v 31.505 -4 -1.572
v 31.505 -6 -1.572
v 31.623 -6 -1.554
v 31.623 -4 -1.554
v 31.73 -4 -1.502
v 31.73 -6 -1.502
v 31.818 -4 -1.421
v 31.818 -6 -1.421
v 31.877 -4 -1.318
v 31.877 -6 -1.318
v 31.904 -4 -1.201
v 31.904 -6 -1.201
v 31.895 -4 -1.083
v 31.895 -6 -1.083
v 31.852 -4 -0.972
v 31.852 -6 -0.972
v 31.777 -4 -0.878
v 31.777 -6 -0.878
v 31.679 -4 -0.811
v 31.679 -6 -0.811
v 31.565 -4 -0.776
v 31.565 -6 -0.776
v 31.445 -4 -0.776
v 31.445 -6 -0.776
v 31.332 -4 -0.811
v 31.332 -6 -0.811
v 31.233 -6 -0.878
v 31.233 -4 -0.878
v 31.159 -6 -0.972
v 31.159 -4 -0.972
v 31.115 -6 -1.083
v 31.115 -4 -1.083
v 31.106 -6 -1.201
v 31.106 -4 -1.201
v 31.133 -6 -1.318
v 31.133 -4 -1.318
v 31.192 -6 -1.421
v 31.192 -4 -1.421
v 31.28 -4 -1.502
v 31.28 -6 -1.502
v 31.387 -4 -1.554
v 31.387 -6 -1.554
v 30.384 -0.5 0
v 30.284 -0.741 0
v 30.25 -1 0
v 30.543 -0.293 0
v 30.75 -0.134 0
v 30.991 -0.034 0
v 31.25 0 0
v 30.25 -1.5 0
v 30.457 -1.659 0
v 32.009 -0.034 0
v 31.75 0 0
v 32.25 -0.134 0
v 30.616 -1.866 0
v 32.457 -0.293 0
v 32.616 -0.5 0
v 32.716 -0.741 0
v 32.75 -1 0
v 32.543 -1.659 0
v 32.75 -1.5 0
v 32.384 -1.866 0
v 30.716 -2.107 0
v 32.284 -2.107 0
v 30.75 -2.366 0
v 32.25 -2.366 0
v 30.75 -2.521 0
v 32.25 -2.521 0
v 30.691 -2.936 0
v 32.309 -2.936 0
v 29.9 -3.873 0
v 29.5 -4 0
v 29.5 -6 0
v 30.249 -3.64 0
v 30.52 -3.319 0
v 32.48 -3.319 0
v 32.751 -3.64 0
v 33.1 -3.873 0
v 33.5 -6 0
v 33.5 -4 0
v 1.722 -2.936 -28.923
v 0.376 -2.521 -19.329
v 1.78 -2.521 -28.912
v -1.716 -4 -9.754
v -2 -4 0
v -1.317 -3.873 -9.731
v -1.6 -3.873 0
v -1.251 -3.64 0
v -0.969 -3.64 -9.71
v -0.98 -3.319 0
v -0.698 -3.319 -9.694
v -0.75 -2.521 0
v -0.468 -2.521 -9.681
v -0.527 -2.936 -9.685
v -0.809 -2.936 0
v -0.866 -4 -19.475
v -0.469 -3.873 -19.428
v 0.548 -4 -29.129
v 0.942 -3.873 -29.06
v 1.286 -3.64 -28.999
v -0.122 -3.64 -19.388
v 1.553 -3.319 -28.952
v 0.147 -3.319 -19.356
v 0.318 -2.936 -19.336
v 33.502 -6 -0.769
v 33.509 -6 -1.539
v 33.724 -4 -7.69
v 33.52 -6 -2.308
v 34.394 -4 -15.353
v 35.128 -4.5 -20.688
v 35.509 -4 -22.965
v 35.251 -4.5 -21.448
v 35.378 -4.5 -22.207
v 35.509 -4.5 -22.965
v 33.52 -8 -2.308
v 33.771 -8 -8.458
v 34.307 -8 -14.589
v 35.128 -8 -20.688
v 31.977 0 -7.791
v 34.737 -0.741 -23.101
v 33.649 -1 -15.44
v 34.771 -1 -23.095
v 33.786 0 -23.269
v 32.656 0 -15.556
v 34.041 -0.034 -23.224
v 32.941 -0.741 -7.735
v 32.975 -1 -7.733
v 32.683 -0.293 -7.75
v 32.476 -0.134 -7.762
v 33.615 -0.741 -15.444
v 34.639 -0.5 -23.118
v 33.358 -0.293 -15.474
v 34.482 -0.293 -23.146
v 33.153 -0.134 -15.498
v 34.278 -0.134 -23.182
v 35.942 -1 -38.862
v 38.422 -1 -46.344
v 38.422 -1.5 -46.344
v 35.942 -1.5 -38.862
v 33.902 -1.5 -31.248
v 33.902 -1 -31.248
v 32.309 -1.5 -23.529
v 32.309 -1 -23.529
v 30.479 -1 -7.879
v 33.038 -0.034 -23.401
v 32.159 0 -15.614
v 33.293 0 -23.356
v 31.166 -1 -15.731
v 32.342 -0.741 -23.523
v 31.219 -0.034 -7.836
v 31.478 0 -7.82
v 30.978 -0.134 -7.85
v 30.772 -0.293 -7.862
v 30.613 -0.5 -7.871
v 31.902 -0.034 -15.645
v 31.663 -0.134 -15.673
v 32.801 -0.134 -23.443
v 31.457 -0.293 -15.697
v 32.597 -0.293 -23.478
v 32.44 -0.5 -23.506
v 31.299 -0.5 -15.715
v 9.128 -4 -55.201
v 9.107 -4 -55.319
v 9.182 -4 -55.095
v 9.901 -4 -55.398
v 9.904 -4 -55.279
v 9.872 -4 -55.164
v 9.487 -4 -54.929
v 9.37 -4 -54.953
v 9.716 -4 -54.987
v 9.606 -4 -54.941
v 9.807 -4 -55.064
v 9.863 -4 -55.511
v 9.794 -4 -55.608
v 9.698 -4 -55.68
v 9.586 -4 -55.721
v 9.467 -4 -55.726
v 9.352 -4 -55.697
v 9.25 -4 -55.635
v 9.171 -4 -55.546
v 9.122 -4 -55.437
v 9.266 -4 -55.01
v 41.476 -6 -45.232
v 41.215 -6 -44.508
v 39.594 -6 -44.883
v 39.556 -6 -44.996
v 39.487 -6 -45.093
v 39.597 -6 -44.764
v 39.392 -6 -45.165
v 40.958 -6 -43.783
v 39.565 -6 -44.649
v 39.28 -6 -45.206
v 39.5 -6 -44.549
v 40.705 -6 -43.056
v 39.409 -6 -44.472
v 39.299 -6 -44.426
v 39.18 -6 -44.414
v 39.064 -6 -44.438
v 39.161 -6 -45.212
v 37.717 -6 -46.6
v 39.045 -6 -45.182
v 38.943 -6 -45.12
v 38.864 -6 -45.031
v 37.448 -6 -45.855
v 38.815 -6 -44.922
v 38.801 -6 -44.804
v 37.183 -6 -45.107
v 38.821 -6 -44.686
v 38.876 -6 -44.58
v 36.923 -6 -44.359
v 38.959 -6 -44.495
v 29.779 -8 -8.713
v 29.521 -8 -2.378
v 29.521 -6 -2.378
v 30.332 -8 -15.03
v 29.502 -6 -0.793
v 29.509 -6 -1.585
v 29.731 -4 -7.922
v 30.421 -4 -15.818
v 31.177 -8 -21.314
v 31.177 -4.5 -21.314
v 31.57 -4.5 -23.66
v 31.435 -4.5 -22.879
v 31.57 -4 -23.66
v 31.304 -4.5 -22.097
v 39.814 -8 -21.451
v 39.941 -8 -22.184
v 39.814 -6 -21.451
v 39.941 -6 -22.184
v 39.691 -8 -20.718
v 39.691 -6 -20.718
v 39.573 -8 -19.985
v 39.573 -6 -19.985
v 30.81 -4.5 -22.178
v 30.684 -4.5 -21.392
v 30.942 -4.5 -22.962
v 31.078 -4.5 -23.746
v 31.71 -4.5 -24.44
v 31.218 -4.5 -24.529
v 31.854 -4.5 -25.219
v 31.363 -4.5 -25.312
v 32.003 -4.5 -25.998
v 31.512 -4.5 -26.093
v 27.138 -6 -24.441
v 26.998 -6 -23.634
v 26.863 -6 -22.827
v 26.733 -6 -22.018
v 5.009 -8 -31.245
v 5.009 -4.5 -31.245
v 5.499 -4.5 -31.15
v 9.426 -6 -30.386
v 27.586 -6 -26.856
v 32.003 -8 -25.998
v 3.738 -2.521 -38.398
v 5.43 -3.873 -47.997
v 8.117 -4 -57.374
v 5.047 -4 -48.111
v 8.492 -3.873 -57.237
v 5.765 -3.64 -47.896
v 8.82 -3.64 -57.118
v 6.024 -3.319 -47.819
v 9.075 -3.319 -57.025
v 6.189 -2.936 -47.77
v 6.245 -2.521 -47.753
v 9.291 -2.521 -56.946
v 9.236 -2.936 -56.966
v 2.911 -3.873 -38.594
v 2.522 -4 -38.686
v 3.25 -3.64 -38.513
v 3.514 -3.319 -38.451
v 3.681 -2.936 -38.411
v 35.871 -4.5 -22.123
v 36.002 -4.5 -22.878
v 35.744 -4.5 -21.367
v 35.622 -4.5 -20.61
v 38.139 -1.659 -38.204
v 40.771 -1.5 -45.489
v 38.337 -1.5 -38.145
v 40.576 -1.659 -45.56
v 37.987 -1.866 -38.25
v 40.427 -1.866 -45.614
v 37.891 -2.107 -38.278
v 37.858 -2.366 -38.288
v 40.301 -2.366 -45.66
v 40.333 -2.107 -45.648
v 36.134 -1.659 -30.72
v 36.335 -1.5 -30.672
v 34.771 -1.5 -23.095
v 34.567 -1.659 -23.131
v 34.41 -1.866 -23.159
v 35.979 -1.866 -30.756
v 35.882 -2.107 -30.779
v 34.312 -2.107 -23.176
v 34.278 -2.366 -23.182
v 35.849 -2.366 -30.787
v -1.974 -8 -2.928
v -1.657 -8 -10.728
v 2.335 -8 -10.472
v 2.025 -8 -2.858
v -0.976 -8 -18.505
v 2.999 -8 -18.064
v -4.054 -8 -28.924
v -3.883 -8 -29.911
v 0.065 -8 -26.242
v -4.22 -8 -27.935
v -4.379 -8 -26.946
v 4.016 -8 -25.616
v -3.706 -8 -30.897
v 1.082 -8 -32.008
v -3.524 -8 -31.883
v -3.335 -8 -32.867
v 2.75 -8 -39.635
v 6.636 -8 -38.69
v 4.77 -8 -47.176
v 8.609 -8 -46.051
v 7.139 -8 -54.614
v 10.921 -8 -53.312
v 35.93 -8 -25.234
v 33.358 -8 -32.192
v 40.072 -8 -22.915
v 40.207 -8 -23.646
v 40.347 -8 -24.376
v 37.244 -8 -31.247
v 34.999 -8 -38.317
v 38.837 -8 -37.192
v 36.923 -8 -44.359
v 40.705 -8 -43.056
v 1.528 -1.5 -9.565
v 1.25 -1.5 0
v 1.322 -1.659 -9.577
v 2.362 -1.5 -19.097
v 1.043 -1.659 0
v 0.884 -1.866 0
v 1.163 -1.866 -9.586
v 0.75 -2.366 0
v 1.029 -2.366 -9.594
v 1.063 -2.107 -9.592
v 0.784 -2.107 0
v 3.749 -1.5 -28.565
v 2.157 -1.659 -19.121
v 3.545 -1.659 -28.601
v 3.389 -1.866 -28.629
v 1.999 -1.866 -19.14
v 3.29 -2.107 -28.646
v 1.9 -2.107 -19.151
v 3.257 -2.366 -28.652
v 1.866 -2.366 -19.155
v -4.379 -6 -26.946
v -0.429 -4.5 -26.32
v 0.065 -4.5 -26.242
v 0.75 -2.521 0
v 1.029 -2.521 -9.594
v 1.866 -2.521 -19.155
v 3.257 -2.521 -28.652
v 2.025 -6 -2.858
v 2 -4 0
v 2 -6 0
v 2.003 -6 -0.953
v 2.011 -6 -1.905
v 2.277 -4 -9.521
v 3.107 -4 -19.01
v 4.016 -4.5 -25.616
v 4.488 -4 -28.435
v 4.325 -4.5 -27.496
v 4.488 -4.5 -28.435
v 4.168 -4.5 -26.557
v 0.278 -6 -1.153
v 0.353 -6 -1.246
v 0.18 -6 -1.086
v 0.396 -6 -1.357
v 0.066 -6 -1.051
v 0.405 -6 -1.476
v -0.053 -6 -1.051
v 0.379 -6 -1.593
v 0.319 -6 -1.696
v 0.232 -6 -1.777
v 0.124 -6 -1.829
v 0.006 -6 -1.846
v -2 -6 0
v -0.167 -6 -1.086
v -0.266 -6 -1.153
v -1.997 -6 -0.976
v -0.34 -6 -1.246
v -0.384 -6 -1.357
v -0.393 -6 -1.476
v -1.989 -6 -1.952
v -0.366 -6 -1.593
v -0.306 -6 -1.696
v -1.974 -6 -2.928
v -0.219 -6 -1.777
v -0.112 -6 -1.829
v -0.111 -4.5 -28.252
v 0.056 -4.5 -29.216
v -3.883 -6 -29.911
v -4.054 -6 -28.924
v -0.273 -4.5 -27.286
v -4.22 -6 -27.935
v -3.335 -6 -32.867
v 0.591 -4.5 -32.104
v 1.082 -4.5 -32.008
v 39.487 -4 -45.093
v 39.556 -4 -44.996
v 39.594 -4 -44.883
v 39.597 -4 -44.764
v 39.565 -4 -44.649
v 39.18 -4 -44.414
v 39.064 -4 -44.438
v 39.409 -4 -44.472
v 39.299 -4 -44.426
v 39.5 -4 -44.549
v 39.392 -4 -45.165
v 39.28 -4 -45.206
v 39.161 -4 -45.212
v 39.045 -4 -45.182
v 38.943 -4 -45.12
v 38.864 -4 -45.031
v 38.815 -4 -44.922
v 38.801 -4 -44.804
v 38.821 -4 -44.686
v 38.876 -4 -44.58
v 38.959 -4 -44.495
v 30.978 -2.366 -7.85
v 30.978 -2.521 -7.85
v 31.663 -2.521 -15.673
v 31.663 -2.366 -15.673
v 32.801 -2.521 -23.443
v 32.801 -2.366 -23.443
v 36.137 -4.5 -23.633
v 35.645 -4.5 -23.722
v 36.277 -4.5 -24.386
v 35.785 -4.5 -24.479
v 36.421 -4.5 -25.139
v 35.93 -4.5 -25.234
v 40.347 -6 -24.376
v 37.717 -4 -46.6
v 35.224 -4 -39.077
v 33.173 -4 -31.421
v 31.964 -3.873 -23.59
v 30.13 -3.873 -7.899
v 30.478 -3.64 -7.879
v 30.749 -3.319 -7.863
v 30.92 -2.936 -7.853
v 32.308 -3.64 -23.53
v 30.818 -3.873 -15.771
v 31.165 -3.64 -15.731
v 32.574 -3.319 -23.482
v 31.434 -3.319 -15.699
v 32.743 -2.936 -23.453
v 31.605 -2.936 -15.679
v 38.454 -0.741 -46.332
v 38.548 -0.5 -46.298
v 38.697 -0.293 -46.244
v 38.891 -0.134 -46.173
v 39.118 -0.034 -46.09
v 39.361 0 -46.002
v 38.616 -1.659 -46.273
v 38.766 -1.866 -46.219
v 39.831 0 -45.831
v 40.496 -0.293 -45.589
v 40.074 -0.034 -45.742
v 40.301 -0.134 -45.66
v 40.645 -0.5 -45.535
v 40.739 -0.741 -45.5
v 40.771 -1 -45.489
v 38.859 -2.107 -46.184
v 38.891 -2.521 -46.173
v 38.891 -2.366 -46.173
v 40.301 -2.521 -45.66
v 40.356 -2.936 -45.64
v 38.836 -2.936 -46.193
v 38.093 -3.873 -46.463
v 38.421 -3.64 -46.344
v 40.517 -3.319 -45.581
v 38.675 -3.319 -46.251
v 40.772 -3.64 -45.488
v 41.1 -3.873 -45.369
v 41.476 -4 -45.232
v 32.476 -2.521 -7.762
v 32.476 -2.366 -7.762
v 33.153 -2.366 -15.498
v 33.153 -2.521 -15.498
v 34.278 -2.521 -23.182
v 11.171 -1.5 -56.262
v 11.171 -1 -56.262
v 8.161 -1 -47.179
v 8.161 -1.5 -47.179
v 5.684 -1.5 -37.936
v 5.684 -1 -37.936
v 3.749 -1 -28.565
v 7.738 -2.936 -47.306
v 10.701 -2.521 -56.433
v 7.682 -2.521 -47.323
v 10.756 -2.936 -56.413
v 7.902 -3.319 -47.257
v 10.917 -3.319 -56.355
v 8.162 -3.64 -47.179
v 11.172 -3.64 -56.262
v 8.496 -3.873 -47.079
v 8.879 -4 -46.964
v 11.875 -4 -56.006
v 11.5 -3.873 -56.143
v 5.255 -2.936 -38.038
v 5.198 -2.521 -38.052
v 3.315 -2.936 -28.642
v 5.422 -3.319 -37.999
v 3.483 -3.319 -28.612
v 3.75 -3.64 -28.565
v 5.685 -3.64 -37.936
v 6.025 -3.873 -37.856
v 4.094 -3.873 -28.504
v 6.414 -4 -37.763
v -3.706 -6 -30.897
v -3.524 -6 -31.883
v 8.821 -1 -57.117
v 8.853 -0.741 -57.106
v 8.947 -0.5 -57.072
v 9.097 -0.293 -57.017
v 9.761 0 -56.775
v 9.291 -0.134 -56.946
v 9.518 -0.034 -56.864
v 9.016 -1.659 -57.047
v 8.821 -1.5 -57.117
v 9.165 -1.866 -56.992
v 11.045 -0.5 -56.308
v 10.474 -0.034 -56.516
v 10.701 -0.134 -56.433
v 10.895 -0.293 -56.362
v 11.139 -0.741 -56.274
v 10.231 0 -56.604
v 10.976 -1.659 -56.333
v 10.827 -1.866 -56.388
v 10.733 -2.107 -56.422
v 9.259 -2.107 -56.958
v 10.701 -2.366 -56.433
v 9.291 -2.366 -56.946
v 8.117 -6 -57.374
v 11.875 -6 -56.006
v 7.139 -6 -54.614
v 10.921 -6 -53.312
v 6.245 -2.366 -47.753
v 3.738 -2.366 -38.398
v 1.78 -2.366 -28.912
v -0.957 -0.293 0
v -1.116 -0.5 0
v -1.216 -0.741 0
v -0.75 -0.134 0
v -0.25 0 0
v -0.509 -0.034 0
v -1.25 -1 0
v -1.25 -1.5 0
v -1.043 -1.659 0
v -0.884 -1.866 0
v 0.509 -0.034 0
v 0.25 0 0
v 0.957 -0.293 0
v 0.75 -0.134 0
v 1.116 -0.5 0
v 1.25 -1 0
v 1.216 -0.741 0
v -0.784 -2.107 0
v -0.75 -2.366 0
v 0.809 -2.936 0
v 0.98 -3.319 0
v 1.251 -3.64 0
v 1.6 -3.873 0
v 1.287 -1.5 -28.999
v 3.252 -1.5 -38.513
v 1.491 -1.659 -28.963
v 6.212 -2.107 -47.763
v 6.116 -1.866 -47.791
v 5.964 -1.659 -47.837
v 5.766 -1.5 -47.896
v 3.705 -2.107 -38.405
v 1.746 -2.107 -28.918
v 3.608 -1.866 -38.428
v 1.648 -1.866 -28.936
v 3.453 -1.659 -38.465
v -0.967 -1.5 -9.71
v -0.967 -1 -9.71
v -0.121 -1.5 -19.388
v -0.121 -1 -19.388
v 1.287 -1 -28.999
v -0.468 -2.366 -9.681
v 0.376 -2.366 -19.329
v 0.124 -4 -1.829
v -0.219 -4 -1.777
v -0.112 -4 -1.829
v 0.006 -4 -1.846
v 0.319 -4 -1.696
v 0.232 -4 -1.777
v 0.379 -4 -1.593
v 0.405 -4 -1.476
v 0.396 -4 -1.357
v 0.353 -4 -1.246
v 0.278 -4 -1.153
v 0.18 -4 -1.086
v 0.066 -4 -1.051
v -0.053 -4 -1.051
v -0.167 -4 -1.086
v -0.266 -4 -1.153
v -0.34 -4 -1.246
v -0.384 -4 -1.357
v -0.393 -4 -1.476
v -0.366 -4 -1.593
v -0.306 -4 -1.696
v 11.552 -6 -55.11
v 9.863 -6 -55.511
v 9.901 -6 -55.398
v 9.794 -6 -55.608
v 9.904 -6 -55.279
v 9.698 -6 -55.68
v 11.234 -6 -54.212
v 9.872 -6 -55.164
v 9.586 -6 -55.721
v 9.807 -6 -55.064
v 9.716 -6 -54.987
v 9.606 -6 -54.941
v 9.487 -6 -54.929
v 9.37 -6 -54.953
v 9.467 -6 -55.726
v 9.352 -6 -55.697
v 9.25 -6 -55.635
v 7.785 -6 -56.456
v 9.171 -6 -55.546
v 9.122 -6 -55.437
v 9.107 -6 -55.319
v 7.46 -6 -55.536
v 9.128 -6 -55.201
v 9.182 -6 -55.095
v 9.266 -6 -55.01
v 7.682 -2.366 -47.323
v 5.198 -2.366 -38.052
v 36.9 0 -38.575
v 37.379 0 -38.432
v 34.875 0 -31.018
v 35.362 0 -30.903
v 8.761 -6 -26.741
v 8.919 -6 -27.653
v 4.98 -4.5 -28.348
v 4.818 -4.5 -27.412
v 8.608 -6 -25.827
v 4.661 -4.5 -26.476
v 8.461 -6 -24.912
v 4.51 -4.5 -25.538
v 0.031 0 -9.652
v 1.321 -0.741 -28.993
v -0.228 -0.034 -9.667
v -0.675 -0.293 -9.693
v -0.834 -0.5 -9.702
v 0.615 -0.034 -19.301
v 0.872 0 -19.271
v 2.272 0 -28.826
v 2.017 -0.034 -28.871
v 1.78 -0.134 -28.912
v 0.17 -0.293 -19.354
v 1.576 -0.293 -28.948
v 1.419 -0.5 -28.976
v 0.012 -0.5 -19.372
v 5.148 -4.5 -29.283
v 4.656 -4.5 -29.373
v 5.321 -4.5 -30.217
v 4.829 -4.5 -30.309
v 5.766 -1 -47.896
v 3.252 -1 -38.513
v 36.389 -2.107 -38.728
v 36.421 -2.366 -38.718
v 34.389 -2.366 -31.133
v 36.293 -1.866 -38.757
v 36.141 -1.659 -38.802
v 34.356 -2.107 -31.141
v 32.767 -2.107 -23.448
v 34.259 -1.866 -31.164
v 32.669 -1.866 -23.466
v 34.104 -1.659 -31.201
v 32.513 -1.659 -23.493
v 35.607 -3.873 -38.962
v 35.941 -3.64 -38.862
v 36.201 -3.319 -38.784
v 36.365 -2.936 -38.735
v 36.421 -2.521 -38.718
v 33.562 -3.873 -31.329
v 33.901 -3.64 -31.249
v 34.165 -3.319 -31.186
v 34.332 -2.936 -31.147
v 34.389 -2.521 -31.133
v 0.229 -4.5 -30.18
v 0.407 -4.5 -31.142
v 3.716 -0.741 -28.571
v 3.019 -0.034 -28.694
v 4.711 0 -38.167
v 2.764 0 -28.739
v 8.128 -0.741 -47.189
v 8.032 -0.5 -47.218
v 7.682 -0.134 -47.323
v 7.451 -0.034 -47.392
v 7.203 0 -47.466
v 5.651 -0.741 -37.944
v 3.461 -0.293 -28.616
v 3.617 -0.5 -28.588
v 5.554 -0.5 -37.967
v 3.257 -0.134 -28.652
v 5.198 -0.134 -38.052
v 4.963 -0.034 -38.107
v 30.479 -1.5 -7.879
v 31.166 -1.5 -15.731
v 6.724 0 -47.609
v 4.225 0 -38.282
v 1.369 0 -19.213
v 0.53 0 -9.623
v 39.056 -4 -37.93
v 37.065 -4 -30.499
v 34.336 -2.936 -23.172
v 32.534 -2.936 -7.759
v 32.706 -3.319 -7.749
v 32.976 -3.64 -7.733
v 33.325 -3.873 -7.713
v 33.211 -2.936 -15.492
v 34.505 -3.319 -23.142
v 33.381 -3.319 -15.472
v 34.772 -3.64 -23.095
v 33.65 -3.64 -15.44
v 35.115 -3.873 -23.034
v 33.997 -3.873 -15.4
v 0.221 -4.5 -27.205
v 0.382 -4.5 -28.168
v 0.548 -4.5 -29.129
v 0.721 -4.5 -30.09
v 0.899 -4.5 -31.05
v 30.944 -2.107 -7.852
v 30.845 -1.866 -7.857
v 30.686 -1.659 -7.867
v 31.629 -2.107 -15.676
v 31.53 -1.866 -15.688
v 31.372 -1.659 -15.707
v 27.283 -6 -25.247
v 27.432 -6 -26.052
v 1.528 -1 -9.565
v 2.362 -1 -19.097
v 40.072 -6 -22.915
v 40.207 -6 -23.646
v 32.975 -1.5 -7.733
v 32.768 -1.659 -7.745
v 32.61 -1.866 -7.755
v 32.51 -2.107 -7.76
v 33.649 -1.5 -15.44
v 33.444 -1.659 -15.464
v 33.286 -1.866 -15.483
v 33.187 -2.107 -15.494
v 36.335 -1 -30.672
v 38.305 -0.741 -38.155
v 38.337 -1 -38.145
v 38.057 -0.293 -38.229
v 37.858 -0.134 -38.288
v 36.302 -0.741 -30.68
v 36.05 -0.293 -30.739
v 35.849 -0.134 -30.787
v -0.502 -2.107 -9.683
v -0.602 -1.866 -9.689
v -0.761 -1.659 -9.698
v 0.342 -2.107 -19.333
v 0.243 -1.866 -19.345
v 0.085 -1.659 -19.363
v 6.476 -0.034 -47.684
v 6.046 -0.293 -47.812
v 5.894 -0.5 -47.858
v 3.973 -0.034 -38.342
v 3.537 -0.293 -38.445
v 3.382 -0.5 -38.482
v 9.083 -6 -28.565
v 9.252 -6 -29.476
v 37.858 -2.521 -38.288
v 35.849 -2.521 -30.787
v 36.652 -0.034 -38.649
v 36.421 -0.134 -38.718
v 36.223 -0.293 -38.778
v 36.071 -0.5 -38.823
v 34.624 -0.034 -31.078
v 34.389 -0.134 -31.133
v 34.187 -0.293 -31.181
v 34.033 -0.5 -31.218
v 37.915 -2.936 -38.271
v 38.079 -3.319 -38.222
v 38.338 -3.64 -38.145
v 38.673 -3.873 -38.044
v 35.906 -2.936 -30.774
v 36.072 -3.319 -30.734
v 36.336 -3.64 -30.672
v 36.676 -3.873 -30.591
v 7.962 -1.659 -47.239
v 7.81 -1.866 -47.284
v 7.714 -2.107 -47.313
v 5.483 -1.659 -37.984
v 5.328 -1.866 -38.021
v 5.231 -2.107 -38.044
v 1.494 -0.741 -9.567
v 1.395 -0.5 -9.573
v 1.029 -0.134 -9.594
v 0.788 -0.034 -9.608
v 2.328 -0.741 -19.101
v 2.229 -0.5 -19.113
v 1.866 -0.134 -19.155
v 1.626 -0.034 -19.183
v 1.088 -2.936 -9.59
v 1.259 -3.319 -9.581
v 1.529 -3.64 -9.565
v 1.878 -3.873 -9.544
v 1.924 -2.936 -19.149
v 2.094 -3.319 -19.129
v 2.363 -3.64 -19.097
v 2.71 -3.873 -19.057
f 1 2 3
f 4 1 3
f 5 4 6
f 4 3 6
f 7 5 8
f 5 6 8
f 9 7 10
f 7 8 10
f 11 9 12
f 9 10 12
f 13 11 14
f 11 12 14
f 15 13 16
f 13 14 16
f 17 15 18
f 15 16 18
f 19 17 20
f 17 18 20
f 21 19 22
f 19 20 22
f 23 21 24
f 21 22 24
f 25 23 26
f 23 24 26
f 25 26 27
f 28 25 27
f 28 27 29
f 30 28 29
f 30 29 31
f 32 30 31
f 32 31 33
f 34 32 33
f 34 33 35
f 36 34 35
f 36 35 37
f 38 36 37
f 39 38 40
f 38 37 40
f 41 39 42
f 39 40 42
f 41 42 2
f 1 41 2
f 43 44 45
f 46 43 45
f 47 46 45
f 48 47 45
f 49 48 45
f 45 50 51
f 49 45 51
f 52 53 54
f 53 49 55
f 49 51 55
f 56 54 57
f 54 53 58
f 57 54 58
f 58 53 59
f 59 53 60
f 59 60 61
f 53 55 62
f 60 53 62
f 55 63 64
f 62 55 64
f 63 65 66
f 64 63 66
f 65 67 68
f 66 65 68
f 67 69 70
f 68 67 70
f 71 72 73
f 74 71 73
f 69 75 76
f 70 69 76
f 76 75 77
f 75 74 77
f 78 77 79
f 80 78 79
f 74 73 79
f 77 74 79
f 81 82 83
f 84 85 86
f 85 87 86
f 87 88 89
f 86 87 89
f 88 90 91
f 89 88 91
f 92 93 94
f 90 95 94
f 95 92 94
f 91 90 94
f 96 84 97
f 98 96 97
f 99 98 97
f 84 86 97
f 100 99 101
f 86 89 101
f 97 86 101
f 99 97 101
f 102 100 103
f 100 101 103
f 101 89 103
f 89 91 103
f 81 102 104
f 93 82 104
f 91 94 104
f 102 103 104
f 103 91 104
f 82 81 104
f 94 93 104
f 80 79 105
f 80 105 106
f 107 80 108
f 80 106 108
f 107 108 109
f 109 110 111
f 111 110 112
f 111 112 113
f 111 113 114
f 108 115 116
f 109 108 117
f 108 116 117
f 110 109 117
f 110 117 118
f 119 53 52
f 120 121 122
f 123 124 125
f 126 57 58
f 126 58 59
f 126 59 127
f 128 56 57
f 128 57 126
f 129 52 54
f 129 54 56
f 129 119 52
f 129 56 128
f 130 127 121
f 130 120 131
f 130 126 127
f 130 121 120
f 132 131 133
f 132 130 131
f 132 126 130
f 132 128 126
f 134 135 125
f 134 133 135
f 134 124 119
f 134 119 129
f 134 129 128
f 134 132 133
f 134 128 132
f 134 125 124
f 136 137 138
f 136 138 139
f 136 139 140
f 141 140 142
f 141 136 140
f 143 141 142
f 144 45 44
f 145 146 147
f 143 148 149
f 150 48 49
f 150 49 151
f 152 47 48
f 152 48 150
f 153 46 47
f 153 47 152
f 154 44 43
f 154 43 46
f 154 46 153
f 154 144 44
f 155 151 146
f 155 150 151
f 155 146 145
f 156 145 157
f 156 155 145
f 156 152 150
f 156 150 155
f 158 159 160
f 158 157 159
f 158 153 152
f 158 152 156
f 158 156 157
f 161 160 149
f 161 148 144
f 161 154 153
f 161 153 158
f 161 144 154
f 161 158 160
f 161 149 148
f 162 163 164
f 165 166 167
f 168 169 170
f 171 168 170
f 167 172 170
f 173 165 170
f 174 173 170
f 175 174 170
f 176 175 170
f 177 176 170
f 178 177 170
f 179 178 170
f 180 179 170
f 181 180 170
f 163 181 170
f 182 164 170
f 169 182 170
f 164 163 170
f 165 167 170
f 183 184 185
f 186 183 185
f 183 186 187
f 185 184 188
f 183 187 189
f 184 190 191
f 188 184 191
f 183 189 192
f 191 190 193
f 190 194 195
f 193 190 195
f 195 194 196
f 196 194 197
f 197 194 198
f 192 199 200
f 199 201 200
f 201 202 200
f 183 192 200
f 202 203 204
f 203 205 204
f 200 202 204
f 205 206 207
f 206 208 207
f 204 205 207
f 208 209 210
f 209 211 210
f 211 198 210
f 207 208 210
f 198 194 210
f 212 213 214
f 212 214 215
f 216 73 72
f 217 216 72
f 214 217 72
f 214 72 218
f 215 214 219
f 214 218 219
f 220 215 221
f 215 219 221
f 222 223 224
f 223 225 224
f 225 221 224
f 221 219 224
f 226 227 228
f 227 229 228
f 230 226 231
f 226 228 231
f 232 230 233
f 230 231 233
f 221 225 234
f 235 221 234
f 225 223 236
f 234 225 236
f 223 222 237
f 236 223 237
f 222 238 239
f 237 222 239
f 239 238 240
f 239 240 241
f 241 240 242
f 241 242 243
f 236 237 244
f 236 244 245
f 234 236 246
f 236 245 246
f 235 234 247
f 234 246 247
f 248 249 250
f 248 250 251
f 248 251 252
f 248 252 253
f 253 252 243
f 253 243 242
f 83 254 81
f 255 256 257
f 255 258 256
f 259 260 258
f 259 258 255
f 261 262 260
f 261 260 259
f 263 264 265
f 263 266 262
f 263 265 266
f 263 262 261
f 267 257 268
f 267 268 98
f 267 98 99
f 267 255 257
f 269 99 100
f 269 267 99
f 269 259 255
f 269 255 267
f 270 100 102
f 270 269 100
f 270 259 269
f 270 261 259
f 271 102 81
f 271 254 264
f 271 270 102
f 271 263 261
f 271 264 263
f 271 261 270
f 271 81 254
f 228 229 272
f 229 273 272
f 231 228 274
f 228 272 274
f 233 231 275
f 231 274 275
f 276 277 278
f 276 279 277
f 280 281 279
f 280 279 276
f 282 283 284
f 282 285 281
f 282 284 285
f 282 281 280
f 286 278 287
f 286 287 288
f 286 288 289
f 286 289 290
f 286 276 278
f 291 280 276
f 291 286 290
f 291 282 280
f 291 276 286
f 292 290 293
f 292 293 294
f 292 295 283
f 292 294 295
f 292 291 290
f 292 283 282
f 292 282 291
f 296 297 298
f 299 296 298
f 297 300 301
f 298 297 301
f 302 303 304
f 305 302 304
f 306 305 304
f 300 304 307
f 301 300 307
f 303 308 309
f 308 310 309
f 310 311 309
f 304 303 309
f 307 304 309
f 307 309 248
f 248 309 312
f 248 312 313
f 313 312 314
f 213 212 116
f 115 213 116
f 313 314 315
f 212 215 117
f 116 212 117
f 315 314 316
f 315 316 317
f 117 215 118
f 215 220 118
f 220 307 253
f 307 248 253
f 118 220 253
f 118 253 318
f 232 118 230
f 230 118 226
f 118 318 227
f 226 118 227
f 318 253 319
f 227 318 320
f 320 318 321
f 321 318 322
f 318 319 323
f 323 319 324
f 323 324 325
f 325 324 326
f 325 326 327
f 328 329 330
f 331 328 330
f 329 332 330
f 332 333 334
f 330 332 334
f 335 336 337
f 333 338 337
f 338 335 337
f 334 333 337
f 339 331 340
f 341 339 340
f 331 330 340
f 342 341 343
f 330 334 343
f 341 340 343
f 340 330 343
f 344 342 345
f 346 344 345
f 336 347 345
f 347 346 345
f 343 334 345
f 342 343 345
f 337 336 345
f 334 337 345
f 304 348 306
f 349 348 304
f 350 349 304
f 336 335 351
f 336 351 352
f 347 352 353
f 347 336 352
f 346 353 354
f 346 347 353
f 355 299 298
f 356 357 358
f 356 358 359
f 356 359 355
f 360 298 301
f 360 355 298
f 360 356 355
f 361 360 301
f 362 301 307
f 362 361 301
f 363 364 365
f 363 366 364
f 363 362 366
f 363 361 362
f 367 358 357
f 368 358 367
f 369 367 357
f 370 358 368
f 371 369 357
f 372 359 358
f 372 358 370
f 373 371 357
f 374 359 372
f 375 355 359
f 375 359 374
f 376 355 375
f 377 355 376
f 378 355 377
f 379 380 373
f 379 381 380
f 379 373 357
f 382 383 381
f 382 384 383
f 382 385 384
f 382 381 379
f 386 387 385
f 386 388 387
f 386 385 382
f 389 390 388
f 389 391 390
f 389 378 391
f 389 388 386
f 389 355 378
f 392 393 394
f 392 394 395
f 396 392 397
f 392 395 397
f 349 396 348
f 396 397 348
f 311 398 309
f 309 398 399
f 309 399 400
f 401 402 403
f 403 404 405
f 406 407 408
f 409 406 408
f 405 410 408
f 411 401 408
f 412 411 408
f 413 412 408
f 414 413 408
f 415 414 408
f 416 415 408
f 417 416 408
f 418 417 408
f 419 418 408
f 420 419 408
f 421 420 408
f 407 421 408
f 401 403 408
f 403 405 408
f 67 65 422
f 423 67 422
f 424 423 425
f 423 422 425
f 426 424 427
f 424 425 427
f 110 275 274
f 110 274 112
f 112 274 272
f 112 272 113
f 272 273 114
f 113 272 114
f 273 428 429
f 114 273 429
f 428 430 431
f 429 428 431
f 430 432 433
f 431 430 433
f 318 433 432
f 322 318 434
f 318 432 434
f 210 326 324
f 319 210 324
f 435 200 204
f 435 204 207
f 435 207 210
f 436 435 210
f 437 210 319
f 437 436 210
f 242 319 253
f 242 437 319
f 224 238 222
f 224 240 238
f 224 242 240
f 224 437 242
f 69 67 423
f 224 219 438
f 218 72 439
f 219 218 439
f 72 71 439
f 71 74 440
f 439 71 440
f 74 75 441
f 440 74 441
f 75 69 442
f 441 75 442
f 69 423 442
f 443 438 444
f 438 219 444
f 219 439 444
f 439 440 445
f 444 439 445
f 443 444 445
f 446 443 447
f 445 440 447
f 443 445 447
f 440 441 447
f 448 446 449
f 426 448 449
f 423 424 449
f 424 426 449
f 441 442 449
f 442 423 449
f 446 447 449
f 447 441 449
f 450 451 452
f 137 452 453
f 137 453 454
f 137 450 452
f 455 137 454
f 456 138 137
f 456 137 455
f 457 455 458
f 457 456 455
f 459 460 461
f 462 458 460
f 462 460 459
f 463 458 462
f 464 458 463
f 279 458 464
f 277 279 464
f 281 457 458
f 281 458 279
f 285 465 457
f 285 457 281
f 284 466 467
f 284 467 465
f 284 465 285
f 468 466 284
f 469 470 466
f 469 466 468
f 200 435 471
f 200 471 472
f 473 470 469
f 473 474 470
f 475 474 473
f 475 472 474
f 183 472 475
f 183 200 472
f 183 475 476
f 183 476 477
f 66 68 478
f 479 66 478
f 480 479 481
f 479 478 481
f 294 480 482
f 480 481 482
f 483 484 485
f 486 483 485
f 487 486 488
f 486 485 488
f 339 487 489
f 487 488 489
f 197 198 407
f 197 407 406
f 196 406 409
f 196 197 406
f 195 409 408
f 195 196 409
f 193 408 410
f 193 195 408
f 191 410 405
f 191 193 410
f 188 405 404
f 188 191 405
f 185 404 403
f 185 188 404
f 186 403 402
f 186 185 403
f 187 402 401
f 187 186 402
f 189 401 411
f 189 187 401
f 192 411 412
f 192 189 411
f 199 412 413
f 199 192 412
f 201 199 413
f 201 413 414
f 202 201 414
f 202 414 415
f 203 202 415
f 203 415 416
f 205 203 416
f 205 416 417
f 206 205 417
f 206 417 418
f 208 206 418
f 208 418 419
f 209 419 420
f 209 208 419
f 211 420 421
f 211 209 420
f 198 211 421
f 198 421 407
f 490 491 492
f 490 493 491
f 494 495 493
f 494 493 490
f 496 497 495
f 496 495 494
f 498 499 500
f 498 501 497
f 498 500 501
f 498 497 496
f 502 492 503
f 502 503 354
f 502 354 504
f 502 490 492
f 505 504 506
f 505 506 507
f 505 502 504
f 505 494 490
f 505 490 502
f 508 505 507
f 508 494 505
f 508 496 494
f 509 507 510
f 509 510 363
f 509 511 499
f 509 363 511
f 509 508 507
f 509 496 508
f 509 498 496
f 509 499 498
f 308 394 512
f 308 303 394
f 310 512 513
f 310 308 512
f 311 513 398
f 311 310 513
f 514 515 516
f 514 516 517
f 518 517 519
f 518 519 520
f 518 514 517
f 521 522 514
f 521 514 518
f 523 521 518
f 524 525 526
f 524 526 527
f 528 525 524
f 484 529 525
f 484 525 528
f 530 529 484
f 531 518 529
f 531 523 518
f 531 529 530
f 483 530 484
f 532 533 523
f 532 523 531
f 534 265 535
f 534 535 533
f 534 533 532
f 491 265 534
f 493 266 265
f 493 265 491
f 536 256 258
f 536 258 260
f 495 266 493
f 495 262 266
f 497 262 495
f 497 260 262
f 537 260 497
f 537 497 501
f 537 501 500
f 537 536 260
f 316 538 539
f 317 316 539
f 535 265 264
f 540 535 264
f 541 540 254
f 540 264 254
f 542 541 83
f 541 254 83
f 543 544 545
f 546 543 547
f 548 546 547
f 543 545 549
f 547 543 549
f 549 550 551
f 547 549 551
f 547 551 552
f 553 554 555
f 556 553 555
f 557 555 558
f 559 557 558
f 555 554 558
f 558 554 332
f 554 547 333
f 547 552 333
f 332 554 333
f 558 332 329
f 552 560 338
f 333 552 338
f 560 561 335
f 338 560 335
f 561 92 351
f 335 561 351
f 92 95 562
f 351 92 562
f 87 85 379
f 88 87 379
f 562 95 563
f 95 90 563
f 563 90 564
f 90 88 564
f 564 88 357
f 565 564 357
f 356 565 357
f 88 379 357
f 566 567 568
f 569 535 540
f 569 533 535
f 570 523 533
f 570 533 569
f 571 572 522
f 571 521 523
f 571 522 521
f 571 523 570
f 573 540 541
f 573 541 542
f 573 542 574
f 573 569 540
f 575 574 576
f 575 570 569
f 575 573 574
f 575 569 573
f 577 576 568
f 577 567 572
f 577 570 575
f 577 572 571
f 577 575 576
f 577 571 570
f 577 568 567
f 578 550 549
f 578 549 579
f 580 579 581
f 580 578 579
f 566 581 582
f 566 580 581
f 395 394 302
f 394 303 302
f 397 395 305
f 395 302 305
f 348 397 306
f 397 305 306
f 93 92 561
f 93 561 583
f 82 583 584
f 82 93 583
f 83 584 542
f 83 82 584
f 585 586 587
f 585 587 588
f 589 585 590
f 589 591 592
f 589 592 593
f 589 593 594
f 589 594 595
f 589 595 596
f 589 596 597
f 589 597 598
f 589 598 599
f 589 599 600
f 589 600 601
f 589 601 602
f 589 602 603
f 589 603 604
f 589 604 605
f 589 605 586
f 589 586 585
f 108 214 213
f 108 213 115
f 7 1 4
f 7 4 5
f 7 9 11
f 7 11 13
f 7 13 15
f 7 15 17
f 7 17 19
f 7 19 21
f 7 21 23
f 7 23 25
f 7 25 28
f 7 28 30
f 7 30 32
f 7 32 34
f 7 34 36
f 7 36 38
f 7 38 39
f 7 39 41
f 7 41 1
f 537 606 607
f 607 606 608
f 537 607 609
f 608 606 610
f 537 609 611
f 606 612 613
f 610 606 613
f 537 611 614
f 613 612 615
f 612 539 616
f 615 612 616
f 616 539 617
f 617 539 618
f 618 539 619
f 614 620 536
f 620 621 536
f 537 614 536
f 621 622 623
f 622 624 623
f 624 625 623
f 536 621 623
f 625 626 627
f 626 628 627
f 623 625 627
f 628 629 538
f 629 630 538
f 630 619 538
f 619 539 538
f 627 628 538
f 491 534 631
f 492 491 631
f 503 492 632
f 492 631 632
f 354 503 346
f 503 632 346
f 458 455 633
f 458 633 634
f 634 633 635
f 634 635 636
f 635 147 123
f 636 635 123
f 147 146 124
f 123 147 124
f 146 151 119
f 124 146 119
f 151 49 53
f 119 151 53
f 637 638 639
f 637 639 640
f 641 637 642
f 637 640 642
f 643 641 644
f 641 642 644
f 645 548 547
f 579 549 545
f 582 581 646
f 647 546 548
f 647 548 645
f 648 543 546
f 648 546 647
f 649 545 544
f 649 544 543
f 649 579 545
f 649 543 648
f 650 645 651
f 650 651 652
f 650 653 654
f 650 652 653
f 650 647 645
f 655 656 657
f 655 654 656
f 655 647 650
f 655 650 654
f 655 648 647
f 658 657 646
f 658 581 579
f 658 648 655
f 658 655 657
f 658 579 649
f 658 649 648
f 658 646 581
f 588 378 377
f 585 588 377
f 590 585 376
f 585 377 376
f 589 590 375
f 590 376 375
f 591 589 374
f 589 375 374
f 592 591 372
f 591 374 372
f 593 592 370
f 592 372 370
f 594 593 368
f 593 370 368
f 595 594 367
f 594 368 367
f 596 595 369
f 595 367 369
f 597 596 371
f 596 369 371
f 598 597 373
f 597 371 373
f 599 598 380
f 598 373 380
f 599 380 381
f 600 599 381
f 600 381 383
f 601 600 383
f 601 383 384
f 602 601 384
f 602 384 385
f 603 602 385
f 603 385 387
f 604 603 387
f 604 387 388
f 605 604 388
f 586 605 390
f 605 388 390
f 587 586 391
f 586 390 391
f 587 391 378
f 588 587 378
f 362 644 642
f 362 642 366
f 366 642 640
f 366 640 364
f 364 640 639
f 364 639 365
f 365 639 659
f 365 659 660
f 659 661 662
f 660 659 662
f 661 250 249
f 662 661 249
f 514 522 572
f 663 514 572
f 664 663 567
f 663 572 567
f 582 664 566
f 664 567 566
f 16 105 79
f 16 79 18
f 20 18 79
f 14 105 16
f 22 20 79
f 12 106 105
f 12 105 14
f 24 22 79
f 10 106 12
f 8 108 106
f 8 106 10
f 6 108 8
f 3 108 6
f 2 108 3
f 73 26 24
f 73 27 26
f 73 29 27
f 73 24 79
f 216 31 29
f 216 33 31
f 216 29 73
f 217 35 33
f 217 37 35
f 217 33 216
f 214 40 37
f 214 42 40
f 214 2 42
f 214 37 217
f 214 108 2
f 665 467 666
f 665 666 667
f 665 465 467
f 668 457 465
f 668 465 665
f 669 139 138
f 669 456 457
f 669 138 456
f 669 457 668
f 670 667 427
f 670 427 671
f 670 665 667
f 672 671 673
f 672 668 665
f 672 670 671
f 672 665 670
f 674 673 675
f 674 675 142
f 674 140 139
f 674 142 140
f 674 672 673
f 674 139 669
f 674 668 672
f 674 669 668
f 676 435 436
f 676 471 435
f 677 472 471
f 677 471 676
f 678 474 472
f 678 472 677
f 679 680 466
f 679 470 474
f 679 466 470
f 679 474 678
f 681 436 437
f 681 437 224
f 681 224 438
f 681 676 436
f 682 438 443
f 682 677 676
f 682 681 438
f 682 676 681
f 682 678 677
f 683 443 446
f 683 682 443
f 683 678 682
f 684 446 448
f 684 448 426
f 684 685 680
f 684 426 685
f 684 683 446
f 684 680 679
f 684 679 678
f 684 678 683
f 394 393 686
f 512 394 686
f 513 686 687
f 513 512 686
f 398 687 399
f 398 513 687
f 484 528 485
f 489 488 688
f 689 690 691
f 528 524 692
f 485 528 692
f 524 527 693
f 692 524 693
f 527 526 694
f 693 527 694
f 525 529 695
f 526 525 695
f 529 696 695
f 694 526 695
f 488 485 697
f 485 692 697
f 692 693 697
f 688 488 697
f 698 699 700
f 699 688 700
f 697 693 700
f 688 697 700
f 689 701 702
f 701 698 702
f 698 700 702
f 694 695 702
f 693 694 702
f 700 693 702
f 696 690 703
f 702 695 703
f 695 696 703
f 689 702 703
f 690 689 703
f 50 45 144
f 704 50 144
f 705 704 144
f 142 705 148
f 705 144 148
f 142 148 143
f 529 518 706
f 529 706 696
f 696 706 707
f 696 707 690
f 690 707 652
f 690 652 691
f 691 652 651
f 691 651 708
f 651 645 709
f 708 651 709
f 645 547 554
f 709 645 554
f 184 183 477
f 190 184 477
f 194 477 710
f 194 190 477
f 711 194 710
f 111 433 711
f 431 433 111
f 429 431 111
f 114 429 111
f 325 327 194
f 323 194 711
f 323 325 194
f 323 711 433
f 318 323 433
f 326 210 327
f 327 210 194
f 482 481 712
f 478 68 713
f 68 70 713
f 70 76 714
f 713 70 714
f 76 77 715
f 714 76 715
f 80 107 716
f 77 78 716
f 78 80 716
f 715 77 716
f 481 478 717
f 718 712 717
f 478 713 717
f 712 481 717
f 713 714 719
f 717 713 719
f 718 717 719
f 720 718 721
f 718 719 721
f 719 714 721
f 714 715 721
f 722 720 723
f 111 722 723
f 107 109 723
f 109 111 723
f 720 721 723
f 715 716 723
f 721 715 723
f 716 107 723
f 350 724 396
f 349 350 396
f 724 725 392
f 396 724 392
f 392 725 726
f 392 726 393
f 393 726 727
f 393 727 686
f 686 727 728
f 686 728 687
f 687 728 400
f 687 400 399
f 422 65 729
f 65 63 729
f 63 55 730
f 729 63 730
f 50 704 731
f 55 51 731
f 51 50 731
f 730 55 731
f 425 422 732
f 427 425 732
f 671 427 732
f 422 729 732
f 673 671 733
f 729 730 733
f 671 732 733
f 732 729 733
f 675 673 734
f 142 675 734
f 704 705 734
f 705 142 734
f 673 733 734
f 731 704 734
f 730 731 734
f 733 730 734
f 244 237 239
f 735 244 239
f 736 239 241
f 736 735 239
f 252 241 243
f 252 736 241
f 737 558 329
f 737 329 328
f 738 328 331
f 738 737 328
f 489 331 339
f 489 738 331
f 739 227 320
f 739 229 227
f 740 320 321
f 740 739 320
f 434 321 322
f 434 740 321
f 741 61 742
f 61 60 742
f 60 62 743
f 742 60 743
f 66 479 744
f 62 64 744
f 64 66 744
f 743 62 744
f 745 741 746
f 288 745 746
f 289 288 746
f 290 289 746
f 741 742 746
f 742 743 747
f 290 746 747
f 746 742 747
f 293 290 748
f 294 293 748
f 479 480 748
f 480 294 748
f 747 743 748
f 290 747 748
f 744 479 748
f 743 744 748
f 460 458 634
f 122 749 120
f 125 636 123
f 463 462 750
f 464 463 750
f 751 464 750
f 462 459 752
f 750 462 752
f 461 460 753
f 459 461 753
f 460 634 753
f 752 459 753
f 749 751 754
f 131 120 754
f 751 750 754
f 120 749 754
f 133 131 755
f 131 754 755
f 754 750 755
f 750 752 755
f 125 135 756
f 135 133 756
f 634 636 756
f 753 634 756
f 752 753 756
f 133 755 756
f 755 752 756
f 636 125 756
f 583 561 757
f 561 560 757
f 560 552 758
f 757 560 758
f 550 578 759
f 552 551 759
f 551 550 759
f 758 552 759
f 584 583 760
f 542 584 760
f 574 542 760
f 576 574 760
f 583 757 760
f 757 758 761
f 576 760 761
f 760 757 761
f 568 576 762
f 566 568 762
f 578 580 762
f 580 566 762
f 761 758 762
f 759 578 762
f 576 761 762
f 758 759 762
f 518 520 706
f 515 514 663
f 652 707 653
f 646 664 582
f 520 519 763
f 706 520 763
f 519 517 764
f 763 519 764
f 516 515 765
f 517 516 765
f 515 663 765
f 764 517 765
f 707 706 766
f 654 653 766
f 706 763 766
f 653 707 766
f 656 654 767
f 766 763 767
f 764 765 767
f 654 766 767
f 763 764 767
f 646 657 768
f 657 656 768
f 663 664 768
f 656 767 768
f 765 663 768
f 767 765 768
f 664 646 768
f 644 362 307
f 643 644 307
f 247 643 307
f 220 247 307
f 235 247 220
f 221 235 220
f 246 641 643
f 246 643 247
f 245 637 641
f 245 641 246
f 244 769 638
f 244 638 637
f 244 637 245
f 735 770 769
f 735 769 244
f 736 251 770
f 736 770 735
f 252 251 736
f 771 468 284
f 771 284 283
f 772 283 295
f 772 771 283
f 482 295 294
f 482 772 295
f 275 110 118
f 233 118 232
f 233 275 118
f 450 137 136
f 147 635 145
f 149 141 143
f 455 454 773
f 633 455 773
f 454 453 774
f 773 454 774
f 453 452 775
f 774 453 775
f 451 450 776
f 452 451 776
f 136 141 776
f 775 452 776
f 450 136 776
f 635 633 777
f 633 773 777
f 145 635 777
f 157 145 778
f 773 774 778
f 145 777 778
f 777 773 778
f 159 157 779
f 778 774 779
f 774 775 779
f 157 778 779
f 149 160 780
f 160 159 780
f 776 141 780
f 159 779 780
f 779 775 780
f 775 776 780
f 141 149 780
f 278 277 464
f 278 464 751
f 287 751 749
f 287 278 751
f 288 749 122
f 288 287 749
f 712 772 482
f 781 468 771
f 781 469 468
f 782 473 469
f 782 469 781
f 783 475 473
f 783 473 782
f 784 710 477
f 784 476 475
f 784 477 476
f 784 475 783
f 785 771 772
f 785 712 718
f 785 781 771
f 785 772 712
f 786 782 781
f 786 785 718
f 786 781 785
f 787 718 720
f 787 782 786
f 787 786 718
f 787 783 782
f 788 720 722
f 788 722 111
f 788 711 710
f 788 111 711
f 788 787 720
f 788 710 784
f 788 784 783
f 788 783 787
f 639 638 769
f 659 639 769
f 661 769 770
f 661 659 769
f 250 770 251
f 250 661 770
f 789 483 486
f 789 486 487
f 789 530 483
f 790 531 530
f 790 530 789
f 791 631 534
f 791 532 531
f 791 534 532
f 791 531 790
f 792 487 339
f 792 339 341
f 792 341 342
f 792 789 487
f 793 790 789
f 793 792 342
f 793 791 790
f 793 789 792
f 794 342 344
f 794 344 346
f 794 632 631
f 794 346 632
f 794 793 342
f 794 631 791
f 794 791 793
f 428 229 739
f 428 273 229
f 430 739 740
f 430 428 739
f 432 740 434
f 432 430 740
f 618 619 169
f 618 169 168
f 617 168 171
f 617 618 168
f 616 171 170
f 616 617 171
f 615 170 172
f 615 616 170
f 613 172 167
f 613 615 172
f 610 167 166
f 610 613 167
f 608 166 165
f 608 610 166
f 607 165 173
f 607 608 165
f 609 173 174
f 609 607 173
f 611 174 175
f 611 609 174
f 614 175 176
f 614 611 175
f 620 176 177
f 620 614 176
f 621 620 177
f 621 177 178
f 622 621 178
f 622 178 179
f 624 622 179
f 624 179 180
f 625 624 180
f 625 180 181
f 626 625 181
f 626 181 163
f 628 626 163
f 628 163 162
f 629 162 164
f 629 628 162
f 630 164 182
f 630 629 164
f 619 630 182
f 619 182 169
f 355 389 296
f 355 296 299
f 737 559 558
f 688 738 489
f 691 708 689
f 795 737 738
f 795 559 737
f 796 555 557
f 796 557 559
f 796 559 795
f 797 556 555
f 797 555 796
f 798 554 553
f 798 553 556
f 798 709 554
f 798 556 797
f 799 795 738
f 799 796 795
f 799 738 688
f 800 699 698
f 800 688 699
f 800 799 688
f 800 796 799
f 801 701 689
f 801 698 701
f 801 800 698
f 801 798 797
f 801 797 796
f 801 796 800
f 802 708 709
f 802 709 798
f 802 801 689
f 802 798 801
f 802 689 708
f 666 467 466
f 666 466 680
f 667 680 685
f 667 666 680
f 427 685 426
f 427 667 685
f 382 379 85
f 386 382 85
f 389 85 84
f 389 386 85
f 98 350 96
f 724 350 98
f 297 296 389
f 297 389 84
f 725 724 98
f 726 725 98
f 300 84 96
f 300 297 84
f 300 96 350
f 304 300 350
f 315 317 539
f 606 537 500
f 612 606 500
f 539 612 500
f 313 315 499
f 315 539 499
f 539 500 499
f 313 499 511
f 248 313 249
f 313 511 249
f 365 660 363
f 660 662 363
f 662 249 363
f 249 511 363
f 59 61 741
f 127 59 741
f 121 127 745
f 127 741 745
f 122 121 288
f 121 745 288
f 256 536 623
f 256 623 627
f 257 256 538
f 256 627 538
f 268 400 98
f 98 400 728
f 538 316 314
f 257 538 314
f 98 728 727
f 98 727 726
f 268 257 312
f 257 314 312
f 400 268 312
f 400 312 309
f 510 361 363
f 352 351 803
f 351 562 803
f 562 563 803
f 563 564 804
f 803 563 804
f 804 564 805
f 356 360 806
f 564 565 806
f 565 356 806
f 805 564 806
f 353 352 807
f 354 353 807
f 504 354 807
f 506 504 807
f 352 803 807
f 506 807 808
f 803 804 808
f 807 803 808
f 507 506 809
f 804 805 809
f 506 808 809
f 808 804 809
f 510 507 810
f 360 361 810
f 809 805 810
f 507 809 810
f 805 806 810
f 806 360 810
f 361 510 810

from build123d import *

# Parameters (mm, degrees)
REVOLVE_1_ANGLE     = 10
FILLET_1_R          = 1.5
FILLET_2_R          = 1.5
FILLET_3_R          = 1
FILLET_4_R          = 1
SKETCH_7_W          = 4
SKETCH_7_H          = 2
CUT_REVOLVE_1_ANGLE = 1
SKETCH_10_R         = 0.4
CUT_EXTRUDE_1_DEPTH = 2
REVOLVE_2_ANGLE     = 1


with BuildPart() as part:
    # 草图4 → 旋转1 (revolve)
    with BuildSketch(Plane.XY):
        Polygon((0.75, -1.5), (1.25, -1.5), (1.25, 0), (0, 0), (-1.25, 0), (-1.25, -1.5), (-0.75, -1.5), (-0.75, -4), (-2, -4), (-2, -8), (0, -8), (2, -8), (2, -4), (0.75, -4), align=None)
        Polygon((31.5, 0), (32.75, 0), (32.75, -1.5), (32.25, -1.5), (32.25, -4), (33.5, -4), (33.5, -8), (31.5, -8), (29.5, -8), (29.5, -4), (30.75, -4), (30.75, -1.5), (30.25, -1.5), (30.25, 0), align=None)
    revolve(axis=Axis((165.75, 3.853460973, 0), (0, -1, 0)), revolution_arc=REVOLVE_1_ANGLE)

    # 圆角1
    # the kernel refuses this fillet: 1.5 mm, written as the material it adds along each edge
    with BuildSketch(Plane(origin=(165.75, -4, 0), x_dir=(-1, 0, 0), z_dir=(0, 0, 1))) as fillet_1_piece_1:
        with BuildLine():
            CenterArc((163.5, -1.479019946), FILLET_1_R, 0, 80.405931773)
            Line((165, -1.479019946), (165.03, -1.479019946))
            Line((165.03, -1.479019946), (165.03, 0))
            Line((165.03, 0), (165, 0.03))
            ThreePointArc((165, 0.03), (164.375, 0.03), (163.755, 0.029580399))
            Line((163.755, 0.029580399), (163.75, 0))
        make_face()
    revolve(axis=Axis((165.75, -4, 0), (0, -1, 0)), revolution_arc=10)
    with BuildSketch(Plane(origin=(165.75, -4, 0), x_dir=(-1, 0, 0), z_dir=(0, 0, 1))) as fillet_1_piece_2:
        with BuildLine():
            CenterArc((168, -1.479019946), FILLET_1_R, 99.594068227, 80.405931773)
            Line((166.5, -1.479019946), (166.47, -1.479019946))
            Line((166.47, -1.479019946), (166.47, 0))
            Line((166.47, 0), (166.5, 0.03))
            ThreePointArc((166.5, 0.03), (167.125, 0.03), (167.745, 0.029580399))
            Line((167.745, 0.029580399), (167.75, 0))
        make_face()
    revolve(axis=Axis((165.75, -4, 0), (0, -1, 0)), revolution_arc=10)

    # 圆角2
    # the kernel refuses this fillet: 1.5 mm, written as the material it adds along each edge
    with BuildSketch(Plane(origin=(165.75, -4, 0), x_dir=(-1, 0, 0), z_dir=(0, 0, 1))) as fillet_2_piece_1:
        with BuildLine():
            CenterArc((136.5, -1.479019946), FILLET_2_R, 99.594068227, 80.405931773)
            Line((136.25, 0), (136.245, 0.029580399))
            ThreePointArc((136.245, 0.029580399), (135.625, 0.03), (135, 0.03))
            Line((135, 0.03), (134.97, 0))
            Line((134.97, 0), (134.97, -1.479019946))
            Line((134.97, -1.479019946), (135, -1.479019946))
        make_face()
    revolve(axis=Axis((165.75, -4, 0), (0, -1, 0)), revolution_arc=10)
    with BuildSketch(Plane(origin=(165.75, -4, 0), x_dir=(-1, 0, 0), z_dir=(0, 0, 1))) as fillet_2_piece_2:
        with BuildLine():
            CenterArc((132, -1.479019946), FILLET_2_R, 0, 80.405931773)
            Line((133.5, -1.479019946), (133.53, -1.479019946))
            Line((133.53, -1.479019946), (133.53, 0))
            Line((133.53, 0), (133.5, 0.03))
            ThreePointArc((133.5, 0.03), (132.875, 0.03), (132.255, 0.029580399))
            Line((132.255, 0.029580399), (132.25, 0))
        make_face()
    revolve(axis=Axis((165.75, -4, 0), (0, -1, 0)), revolution_arc=10)

    # 圆角3
    # the kernel refuses this fillet: 1 mm, written as the material it adds along each edge
    with BuildSketch(Plane(origin=(165.75, -1.5, 0), x_dir=(-1, 0, 0), z_dir=(0, 0, 1))) as fillet_3_piece_1:
        with BuildLine():
            CenterArc((136, 0.866025404), FILLET_3_R, 180, 60)
            Line((135, 0.866025404), (135, 0))
            Line((135, 0), (135.5, 0))
        make_face()
    revolve(axis=Axis((165.75, -1.5, 0), (0, -1, 0)), revolution_arc=10)
    with BuildSketch(Plane(origin=(165.75, -1.5, 0), x_dir=(-1, 0, 0), z_dir=(0, 0, 1))) as fillet_3_piece_2:
        with BuildLine():
            CenterArc((132.5, 0.866025404), FILLET_3_R, 300, 60)
            Line((133, 0), (133.5, 0))
            Line((133.5, 0), (133.5, 0.866025404))
        make_face()
    revolve(axis=Axis((165.75, -1.5, 0), (0, -1, 0)), revolution_arc=10)
    # the kernel refuses this fillet: 1 mm, written as the material it takes off along each edge
    with BuildSketch(Plane(origin=(165.75, 0, 0), x_dir=(-0.9998233399867428, 0, 0.018795978765534377), z_dir=(0.018795978765534377, 0, 0.9998233399867428))) as fillet_3_2_piece_1:
        with BuildLine():
            CenterArc((133 + FILLET_3_R, FILLET_3_R), FILLET_3_R, 180, 90)
            Line((133, FILLET_3_R), (133, 0))
            Line((133, 0), (133 + FILLET_3_R, 0))
        make_face()
    revolve(axis=Axis((165.75, 0, 0), (0, -1, 0)), revolution_arc=12.153987353, mode=Mode.SUBTRACT)
    with BuildSketch(Plane(origin=(165.75, 0, 0), x_dir=(-0.9998297984864879, 0, 0.01844922921070363), z_dir=(0.01844922921070363, 0, 0.9998297984864879))) as fillet_3_2_piece_2:
        with BuildLine():
            CenterArc((135.5 - FILLET_3_R, FILLET_3_R), FILLET_3_R, 270, 90)
            Line((135.5 - FILLET_3_R, 0), (135.5, 0))
            Line((135.5, 0), (135.5, FILLET_3_R))
        make_face()
    revolve(axis=Axis((165.75, 0, 0), (0, -1, 0)), revolution_arc=12.114245889, mode=Mode.SUBTRACT)

    # 圆角4
    # the kernel refuses this fillet: 1 mm, written as the material it adds along each edge
    with BuildSketch(Plane(origin=(165.75, -1.5, 0), x_dir=(-1, 0, 0), z_dir=(0, 0, 1))) as fillet_4_piece_1:
        with BuildLine():
            CenterArc((167.5, 0.866025404), FILLET_4_R, 180, 60)
            Line((167, 0), (166.5, 0))
            Line((166.5, 0), (166.5, 0.866025404))
        make_face()
    revolve(axis=Axis((165.75, -1.5, 0), (0, -1, 0)), revolution_arc=10)
    with BuildSketch(Plane(origin=(165.75, -1.5, 0), x_dir=(-1, 0, 0), z_dir=(0, 0, 1))) as fillet_4_piece_2:
        with BuildLine():
            CenterArc((164, 0.866025404), FILLET_4_R, 300, 60)
            Line((164.5, 0), (165, 0))
            Line((165, 0), (165, 0.866025404))
        make_face()
    revolve(axis=Axis((165.75, -1.5, 0), (0, -1, 0)), revolution_arc=10)
    # the kernel refuses this fillet: 1 mm, written as the material it takes off along each edge
    with BuildSketch(Plane(origin=(165.75, 0, 0), x_dir=(-0.9998845180351503, 0, 0.015197058715919934), z_dir=(0.015197058715919934, 0, 0.9998845180351503))) as fillet_4_2_piece_1:
        with BuildLine():
            CenterArc((164.5 + FILLET_4_R, FILLET_4_R), FILLET_4_R, 180, 90)
            Line((164.5, FILLET_4_R), (164.5, 0))
            Line((164.5, 0), (164.5 + FILLET_4_R, 0))
        make_face()
    revolve(axis=Axis((165.75, 0, 0), (0, -1, 0)), revolution_arc=11.74152169, mode=Mode.SUBTRACT)
    with BuildSketch(Plane(origin=(165.75, 0, 0), x_dir=(-0.9998879496351009, 0, 0.014969574961036002), z_dir=(0.014969574961036002, 0, 0.9998879496351009))) as fillet_4_2_piece_2:
        with BuildLine():
            CenterArc((167 - FILLET_4_R, FILLET_4_R), FILLET_4_R, 270, 90)
            Line((167 - FILLET_4_R, 0), (167, 0))
            Line((167, 0), (167, FILLET_4_R))
        make_face()
    revolve(axis=Axis((165.75, 0, 0), (0, -1, 0)), revolution_arc=11.715451006, mode=Mode.SUBTRACT)

    # 草图7 → 切除-旋转1 (revolve, cut)
    with BuildSketch(Plane.XY):
        with Locations((0, -7)):
            Rectangle(SKETCH_7_W, SKETCH_7_H)
        with Locations((31.5, -7)):
            Rectangle(SKETCH_7_W, SKETCH_7_H)
    revolve(axis=Axis((165.75, 3.853460973, 0), (0, -1, 0)), revolution_arc=CUT_REVOLVE_1_ANGLE, mode=Mode.SUBTRACT)

    # 草图10 → 切除-拉伸1 (cut)
    with BuildSketch(Plane.XZ.offset(6)):
        with Locations(Location((0.006311252, -1.446423259, 0), (0, 0, 270))):
            Circle(SKETCH_10_R)
        with Locations(Location((31.505111829, -1.171537391, 0), (0, 0, 270))):
            Circle(SKETCH_10_R)
    extrude(amount=-CUT_EXTRUDE_1_DEPTH, mode=Mode.SUBTRACT)

    # 草图11 → 旋转2 (revolve)
    with BuildSketch(Plane(origin=(4.997974052, 0, -28.344919378), x_dir=(-0.9848077530122081, 0, -0.17364817766693072), z_dir=(0.17364817766693072, 0, -0.9848077530122081))):
        Polygon((-26.981885062, -4.5), (-26.481885062, -4.5), (-22.481885062, -6), (-3.981885062, -6), (0.018114938, -4.5), (0.518114938, -4.5), (4.518114938, -4.5), (5.018114938, -4.5), (9.018114938, -6), (9.018114938, -8), (4.518114938, -8), (0.518114938, -8), (-26.981885062, -8), (-30.981885062, -8), (-35.481885062, -8), (-35.481885062, -6), (-31.481885062, -4.5), (-30.981885062, -4.5), align=None)
    revolve(axis=Axis((165.75, 3.853460973, 0), (0, 1, 0)), revolution_arc=REVOLVE_2_ANGLE)

    # 镜向1: part across face


with BuildPart() as part_1:
    add(part.part)
    add(part.part.mirror(Plane(origin=(18.028837048, -5.996688627, -26.04722665), x_dir=(0.9848077529548817, 0, 0.17364817799204443), z_dir=(0.17364817799204443, 0, -0.9848077529548818))))


solid = part_1.part
